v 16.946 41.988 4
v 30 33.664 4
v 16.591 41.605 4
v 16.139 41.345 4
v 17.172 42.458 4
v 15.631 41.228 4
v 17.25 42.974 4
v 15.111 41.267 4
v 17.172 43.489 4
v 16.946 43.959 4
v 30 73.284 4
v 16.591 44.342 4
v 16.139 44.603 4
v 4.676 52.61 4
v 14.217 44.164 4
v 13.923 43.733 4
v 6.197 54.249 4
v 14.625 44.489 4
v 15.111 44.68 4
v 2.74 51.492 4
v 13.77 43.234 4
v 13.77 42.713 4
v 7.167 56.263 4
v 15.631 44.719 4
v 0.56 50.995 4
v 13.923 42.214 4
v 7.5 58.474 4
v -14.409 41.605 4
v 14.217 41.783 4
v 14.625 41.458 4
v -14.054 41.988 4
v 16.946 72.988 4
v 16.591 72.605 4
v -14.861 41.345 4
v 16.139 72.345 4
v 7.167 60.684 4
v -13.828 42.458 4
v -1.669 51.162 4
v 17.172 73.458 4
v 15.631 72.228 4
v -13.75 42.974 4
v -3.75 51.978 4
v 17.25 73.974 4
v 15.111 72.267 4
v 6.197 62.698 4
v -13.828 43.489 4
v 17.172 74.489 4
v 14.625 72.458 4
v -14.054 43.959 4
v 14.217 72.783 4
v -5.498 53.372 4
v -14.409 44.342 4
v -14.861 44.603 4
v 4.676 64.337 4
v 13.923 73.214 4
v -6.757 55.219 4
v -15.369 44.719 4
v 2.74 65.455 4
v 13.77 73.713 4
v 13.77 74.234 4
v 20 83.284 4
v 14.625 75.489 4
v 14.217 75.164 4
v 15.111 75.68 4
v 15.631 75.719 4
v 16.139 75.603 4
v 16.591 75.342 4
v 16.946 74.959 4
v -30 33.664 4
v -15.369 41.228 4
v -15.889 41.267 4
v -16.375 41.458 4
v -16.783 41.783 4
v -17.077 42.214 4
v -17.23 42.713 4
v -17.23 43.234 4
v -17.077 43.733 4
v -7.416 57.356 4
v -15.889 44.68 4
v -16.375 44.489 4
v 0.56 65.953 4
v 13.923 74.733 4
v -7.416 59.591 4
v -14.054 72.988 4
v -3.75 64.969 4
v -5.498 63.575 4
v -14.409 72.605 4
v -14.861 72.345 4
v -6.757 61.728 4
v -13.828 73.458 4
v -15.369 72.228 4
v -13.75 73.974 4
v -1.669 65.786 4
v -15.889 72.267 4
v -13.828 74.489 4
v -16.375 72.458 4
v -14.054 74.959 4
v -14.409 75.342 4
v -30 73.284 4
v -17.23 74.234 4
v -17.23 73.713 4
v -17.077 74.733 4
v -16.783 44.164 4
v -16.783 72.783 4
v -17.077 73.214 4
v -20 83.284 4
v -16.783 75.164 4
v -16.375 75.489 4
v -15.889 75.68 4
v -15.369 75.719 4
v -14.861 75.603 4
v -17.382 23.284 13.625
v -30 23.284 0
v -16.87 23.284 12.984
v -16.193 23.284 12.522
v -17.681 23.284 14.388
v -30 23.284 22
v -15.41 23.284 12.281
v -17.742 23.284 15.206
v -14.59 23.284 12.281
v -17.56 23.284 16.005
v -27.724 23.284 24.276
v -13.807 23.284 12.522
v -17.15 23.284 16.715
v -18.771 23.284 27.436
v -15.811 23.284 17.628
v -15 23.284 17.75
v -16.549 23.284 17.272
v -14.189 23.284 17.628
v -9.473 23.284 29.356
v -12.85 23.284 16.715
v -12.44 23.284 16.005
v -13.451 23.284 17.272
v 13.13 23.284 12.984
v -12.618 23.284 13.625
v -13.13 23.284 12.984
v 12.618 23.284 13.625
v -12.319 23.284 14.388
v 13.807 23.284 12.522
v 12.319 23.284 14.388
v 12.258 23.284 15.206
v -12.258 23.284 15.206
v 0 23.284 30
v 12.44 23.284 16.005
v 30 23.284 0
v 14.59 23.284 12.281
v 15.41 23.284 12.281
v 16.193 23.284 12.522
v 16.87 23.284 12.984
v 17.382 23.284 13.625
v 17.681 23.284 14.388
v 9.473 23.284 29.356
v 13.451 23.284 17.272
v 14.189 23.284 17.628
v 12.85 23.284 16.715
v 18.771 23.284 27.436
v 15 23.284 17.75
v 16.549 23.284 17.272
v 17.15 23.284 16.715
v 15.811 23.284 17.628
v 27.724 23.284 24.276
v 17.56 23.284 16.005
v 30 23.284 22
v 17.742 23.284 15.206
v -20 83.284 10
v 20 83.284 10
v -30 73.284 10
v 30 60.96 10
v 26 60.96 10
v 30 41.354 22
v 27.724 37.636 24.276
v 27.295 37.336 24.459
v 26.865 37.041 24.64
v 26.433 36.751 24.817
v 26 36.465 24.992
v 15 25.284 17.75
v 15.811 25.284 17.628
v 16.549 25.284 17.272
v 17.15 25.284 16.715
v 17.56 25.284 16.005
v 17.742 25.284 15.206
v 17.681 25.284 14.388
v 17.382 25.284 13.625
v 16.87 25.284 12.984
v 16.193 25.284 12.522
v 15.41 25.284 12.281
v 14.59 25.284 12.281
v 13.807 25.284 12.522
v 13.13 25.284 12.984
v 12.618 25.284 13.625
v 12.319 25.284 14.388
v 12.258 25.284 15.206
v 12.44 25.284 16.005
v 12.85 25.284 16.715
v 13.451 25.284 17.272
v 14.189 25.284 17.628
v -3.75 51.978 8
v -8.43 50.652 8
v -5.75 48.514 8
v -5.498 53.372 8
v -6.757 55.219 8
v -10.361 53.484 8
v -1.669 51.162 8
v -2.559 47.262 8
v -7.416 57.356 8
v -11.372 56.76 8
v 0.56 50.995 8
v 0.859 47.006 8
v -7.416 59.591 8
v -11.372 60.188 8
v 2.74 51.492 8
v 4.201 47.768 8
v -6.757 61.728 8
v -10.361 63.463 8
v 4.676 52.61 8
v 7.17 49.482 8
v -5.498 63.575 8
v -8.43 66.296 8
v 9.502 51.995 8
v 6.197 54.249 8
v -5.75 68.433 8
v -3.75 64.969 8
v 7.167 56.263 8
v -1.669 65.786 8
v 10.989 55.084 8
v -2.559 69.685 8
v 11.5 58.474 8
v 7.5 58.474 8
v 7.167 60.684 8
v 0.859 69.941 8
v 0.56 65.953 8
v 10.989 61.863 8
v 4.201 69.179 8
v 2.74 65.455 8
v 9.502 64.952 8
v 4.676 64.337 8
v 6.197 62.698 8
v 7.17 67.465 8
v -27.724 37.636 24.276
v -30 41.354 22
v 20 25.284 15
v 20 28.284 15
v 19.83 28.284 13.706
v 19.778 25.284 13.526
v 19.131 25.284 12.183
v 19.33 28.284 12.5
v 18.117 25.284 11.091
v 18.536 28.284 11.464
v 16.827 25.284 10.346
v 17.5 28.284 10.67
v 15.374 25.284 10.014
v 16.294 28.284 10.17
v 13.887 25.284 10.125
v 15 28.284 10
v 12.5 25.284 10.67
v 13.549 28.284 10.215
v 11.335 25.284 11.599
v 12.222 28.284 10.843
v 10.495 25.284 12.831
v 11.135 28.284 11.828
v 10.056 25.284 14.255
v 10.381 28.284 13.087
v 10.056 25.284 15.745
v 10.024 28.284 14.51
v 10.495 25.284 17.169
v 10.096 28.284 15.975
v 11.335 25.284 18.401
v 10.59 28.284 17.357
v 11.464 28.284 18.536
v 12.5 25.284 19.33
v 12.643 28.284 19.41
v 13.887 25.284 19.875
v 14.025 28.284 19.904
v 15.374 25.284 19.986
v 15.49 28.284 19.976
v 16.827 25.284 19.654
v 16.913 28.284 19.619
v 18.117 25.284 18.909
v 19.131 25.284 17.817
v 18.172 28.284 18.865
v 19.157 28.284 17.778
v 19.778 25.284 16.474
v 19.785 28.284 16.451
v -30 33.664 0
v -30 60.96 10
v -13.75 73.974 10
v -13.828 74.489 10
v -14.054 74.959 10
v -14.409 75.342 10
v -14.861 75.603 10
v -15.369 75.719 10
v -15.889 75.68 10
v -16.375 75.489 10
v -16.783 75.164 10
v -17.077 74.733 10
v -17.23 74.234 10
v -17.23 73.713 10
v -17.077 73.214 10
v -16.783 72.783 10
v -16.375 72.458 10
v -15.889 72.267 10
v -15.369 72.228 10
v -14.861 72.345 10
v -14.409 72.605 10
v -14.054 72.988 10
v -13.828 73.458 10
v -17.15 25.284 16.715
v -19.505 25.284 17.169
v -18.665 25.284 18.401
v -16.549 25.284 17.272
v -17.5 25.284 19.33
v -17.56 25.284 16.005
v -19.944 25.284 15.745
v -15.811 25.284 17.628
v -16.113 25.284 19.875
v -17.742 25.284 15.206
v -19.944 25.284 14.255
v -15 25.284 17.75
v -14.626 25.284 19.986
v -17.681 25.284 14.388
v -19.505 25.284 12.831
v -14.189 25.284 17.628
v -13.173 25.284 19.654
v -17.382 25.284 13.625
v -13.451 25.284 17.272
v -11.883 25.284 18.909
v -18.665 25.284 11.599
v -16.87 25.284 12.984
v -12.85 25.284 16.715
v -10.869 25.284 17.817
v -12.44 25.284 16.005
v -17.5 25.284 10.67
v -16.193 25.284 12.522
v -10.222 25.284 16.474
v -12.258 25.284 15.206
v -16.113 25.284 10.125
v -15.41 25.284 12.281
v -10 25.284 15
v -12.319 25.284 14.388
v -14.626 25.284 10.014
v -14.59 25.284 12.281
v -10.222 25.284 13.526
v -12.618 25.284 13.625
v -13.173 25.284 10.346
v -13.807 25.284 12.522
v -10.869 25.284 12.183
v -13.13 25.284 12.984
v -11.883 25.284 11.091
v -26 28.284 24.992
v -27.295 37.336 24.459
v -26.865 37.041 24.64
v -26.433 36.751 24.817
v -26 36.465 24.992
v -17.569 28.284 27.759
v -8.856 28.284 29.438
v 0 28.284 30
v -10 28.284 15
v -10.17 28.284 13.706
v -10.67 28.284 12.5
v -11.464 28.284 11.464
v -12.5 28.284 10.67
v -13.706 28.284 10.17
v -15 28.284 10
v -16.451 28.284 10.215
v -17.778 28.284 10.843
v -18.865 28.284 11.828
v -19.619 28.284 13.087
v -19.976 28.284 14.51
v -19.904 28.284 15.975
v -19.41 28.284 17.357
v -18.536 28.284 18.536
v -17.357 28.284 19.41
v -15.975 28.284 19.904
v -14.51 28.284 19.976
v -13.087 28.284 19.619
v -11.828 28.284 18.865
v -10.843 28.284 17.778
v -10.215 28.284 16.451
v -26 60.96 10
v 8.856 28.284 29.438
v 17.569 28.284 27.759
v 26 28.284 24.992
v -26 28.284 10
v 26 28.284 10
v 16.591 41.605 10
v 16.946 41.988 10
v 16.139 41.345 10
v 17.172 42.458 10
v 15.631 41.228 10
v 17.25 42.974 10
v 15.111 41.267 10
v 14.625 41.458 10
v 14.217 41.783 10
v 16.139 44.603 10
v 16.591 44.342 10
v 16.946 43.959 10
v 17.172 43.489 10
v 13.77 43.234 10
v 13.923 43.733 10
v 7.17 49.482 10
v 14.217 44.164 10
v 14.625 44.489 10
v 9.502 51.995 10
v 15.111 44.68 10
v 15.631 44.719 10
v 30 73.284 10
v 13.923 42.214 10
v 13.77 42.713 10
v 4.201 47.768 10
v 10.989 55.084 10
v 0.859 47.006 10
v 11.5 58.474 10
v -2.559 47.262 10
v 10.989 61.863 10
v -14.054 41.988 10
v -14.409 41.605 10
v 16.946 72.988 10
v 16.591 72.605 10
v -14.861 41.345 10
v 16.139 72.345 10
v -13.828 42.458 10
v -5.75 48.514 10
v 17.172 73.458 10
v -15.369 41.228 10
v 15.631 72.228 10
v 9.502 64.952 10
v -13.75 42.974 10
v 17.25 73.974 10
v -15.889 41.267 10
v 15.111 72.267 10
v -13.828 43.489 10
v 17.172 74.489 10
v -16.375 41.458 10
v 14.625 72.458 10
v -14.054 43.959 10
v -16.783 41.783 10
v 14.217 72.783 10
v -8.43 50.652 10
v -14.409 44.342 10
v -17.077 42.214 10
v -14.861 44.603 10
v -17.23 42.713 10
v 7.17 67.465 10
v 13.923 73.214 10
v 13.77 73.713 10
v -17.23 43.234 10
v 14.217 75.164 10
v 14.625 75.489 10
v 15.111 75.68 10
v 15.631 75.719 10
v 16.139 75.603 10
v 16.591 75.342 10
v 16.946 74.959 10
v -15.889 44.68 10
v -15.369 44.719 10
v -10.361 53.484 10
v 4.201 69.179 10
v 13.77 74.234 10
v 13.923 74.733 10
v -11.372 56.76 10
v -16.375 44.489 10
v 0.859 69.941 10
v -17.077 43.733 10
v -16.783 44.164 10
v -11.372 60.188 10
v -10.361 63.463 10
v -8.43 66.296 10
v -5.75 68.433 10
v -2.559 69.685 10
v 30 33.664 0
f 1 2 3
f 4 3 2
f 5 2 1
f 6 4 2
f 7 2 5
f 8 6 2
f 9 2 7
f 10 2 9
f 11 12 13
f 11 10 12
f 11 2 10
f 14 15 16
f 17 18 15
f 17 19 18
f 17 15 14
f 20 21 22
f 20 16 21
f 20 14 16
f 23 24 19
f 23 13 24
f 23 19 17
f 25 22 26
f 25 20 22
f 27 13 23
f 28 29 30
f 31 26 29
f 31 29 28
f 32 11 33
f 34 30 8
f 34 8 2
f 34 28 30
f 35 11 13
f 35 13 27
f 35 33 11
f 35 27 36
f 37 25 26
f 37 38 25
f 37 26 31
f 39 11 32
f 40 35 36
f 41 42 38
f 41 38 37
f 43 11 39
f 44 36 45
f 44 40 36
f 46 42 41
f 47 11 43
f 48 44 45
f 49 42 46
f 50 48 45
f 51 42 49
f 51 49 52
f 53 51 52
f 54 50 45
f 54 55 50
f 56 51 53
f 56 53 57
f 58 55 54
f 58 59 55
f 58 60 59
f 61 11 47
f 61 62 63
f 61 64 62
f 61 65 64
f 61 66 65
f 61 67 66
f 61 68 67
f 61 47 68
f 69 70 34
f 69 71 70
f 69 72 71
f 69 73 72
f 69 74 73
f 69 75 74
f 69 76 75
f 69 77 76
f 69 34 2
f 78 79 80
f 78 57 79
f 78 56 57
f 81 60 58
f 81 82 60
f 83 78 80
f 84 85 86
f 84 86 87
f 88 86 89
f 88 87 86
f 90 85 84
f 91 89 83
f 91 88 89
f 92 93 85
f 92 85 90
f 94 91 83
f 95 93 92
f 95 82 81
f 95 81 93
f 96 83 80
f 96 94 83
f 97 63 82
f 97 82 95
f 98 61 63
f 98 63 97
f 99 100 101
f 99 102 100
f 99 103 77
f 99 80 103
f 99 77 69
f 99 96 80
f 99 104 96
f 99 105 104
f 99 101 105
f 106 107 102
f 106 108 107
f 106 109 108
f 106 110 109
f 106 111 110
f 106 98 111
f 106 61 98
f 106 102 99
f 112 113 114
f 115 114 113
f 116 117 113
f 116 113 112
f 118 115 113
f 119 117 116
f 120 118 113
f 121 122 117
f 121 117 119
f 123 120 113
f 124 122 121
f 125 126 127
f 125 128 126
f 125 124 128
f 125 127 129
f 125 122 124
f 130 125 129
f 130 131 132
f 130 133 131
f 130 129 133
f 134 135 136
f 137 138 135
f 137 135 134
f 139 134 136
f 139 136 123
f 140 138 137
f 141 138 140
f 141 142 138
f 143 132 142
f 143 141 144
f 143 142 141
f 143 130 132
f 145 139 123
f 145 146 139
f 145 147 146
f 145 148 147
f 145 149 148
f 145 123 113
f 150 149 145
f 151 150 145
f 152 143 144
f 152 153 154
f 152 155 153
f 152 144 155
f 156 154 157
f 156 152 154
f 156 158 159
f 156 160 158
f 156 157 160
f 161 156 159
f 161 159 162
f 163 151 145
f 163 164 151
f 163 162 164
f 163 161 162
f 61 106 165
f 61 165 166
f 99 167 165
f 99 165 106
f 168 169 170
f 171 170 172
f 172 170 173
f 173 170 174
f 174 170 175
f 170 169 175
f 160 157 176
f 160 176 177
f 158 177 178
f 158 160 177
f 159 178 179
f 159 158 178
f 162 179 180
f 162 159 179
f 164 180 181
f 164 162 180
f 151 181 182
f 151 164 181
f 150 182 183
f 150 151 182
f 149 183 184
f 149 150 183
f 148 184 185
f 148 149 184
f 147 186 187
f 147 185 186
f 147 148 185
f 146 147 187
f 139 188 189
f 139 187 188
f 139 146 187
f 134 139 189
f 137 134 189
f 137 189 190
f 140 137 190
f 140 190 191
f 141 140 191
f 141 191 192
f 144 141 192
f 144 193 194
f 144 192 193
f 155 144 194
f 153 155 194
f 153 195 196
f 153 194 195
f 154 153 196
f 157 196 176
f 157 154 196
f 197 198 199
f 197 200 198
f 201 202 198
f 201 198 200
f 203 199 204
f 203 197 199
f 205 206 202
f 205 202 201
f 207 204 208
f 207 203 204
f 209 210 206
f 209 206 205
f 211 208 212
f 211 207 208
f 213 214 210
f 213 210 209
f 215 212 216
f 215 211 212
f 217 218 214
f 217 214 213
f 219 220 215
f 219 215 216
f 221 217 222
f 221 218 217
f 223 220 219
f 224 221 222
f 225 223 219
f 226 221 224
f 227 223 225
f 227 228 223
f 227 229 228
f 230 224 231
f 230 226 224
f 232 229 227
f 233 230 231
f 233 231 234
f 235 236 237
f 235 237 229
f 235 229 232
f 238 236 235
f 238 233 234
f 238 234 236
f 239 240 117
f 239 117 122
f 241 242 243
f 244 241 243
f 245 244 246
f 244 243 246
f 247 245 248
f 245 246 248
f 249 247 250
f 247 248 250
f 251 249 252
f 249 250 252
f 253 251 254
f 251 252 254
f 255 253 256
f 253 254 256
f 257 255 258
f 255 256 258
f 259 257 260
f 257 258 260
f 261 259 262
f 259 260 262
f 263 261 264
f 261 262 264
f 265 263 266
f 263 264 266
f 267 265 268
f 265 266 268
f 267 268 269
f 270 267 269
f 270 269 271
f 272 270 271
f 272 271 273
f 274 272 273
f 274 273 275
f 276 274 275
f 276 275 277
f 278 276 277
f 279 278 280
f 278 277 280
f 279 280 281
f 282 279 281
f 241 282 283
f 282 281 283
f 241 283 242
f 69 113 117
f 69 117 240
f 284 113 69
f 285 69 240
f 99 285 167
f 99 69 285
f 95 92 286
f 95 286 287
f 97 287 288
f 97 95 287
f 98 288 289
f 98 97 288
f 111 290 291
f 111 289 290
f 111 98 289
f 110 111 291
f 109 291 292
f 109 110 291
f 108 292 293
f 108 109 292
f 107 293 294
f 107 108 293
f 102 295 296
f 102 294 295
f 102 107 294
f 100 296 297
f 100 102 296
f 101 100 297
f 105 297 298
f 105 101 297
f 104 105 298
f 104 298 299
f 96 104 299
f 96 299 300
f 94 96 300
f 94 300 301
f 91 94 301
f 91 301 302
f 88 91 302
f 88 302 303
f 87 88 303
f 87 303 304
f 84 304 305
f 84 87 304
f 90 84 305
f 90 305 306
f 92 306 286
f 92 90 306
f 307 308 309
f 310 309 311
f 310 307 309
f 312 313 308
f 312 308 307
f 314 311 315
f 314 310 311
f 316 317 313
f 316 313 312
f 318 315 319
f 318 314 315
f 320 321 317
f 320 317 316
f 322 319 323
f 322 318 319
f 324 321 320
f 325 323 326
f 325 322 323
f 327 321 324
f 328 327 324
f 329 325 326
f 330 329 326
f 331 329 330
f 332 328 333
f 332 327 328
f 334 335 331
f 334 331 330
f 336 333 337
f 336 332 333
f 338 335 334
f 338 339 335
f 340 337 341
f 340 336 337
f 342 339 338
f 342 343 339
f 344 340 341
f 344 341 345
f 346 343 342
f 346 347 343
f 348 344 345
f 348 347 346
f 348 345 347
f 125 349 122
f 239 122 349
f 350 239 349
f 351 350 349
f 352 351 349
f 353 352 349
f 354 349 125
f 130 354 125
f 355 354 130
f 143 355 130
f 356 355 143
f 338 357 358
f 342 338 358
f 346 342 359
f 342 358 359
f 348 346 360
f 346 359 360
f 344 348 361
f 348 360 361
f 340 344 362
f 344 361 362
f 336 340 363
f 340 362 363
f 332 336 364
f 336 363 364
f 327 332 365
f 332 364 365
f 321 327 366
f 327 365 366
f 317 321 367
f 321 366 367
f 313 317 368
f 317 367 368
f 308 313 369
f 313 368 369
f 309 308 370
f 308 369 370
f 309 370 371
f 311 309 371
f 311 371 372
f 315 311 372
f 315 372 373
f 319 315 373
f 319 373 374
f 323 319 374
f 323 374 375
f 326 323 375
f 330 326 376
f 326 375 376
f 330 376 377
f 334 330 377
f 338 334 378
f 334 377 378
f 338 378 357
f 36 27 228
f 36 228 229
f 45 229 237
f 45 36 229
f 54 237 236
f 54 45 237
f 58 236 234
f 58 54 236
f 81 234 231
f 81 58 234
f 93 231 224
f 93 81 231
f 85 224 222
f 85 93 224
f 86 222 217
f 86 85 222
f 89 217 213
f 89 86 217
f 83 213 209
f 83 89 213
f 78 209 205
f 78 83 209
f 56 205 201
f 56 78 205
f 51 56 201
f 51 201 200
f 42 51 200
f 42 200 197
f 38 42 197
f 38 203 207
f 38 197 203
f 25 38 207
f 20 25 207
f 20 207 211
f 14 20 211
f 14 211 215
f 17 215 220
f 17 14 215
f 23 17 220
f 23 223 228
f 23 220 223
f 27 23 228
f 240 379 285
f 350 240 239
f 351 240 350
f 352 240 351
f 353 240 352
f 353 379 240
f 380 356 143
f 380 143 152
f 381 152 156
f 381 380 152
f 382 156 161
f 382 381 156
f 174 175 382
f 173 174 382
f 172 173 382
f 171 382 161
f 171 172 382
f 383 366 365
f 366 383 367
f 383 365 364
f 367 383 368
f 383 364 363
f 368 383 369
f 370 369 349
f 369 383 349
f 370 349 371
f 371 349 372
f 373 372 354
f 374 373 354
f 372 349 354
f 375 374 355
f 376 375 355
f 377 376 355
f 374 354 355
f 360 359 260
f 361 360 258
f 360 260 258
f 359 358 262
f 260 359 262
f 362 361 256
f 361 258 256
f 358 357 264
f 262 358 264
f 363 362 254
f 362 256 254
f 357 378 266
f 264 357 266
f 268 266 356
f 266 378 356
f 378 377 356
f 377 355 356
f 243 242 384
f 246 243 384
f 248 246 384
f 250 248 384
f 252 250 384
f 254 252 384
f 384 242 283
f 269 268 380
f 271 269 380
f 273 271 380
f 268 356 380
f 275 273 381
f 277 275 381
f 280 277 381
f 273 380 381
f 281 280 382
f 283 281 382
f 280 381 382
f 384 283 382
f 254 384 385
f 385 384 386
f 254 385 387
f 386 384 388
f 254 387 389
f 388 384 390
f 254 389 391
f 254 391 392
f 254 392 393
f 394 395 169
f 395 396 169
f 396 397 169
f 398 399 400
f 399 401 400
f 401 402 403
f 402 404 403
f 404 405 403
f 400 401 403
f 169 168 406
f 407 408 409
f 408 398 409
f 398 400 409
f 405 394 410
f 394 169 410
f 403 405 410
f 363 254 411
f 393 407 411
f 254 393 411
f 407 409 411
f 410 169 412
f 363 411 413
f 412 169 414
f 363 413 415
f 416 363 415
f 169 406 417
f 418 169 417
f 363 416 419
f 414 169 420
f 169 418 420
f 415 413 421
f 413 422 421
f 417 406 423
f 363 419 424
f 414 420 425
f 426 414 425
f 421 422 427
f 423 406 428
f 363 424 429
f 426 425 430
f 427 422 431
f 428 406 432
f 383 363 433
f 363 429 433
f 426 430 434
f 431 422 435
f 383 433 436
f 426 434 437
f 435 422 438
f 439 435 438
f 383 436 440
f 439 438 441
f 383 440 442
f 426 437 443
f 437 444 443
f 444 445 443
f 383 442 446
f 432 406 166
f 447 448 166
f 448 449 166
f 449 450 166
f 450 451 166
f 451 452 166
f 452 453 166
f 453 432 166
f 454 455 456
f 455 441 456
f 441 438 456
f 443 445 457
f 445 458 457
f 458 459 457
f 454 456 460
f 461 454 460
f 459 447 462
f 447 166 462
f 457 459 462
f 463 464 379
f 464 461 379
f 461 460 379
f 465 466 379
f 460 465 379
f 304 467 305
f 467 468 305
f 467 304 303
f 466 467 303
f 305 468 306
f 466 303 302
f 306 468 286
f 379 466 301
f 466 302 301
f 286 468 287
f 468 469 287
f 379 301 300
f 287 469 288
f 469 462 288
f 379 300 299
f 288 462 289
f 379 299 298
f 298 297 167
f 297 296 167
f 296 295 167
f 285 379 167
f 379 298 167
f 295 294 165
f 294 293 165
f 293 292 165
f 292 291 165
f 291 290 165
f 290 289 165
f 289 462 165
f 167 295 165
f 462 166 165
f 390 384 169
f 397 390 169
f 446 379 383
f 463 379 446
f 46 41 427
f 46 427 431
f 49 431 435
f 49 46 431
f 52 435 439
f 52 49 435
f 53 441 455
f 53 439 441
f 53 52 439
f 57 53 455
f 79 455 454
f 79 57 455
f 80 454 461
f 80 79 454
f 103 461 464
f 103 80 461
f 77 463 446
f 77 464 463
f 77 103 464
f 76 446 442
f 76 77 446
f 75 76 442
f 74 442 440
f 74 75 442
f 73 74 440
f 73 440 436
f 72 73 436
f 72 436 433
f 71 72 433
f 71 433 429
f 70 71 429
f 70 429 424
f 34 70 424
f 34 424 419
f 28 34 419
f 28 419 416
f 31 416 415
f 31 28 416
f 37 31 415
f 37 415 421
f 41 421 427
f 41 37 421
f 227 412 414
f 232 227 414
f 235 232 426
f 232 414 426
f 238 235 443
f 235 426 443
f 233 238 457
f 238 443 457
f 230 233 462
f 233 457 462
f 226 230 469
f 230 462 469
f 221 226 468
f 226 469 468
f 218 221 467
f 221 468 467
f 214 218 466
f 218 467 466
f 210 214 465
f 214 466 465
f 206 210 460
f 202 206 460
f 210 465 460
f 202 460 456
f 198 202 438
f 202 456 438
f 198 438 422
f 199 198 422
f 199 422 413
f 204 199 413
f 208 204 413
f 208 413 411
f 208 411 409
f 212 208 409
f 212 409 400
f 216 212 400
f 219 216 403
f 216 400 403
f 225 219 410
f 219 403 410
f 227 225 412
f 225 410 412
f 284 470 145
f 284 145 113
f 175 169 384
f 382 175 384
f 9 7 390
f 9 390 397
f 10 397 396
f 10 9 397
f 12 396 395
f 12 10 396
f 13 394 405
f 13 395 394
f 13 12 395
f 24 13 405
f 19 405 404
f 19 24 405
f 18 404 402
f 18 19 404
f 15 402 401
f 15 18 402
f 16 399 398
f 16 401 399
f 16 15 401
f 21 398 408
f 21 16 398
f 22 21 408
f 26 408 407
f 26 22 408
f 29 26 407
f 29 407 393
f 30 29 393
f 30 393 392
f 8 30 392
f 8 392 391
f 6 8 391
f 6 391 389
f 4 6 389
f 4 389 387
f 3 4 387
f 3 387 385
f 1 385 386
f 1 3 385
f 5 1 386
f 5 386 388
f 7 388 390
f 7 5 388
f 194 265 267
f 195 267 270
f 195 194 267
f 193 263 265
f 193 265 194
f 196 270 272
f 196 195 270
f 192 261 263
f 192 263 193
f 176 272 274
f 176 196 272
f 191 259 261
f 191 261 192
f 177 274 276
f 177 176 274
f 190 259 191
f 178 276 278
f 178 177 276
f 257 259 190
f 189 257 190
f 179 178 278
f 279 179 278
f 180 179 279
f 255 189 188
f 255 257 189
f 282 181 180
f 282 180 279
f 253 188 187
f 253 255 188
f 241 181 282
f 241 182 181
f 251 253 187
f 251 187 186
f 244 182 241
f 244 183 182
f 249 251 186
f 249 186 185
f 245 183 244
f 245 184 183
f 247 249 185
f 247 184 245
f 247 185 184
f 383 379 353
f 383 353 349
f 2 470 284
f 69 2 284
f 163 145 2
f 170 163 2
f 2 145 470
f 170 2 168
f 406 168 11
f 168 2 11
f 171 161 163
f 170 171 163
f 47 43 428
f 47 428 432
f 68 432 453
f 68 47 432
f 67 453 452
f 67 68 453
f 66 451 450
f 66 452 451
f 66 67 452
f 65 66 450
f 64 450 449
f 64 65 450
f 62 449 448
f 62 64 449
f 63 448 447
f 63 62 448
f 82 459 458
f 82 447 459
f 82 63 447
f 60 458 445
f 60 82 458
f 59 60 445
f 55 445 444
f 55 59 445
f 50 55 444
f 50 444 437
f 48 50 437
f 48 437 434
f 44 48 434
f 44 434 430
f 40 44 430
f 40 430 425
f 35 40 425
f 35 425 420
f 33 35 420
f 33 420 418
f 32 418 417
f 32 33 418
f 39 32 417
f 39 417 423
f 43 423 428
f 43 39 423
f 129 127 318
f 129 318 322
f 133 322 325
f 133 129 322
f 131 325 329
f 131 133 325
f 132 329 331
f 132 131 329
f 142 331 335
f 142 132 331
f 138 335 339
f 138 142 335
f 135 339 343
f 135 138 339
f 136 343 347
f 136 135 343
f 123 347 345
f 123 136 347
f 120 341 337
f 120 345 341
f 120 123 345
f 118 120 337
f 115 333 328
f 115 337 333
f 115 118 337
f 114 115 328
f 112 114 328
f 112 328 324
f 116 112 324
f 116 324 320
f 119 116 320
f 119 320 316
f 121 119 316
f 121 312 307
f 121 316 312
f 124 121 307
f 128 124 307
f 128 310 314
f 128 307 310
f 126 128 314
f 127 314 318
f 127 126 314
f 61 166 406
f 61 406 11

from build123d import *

# Parameters (mm, degrees)
SKETCH1_W                = 120
SKETCH1_H                = 30
BOSS_EXTRUDE1_DEPTH      = 100
SKETCH3_OUTSIDE_W        = 153.812
SKETCH3_OUTSIDE_H        = 133.812
CUT_EXTRUDE2_DEPTH       = 121.415945788
CUT_EXTRUDE3_START       = -30
CUT_EXTRUDE3_DEPTH       = 30
SKETCH5_W                = 67.698745078
SKETCH5_H                = 100.8
CUT_EXTRUDE4_DEPTH       = 20
RIB1_REACH               = 122.416
SKETCH6_WALL_W           = 281.143052644
SKETCH6_WALL_H           = 4
RIB6_REACH               = 122.416
SKETCH7_WALL_W           = 281.143052644
SKETCH7_WALL_H           = 4
CUT_EXTRUDE5_DEPTH       = 84.326168543
CUT_EXTRUDE5_DEPTH_BACK  = 84.326168543
SKETCH9_R                = 2.75
SKETCH10_R               = 5
CUT_EXTRUDE6_DEPTH       = 3
CHAMFER1_SIZE            = 8
CUT_EXTRUDE7_START       = -14.352520936
CUT_EXTRUDE7_DEPTH       = 14.352520936
SKETCH13_W               = 60
SKETCH13_H               = 40
BOSS_EXTRUDE2_DEPTH      = 10
CUT_EXTRUDE8_DEPTH       = 108.204960324
CUT_EXTRUDE8_DEPTH_BACK  = 108.204960324
SKETCH12_R               = 1.75
SKETCH12_R_2             = 7.5
CHAMFER2_SIZE            = 10
SKETCH14_R               = 11.5
CUT_EXTRUDE9_DEPTH       = 1
BOSS_EXTRUDE3_START      = 1
SKETCH16_W               = 42.5
SKETCH16_H               = 42.5
SKETCH16_R               = 1.75
SKETCH16_R_2             = 11.5
BOSS_EXTRUDE3_DEPTH      = 1
SKETCH17_W               = 48.072912132
SKETCH17_H               = 52.974055018
BOSS_EXTRUDE4_DEPTH      = 10
SKETCH17_2_W             = 48.072912132
SKETCH17_2_H             = 52.974055018
CUT_EXTRUDE10_DEPTH      = 108.204960324
CUT_EXTRUDE11_DEPTH      = 108.204960324
CUT_EXTRUDE11_DEPTH_BACK = 108.204960324
SKETCH18_R               = 7.5
SKETCH18_R_2             = 1.75
SKETCH19_R               = 11.5
CUT_EXTRUDE12_DEPTH      = 2
CUT_EXTRUDE13_DEPTH      = 108.204960324
CUT_EXTRUDE13_DEPTH_BACK = 108.204960324
SKETCH20_W               = 88.74197012
SKETCH20_H               = 29.925009901
CHAMFER3_SIZE            = 10
SKETCH22_W               = 69.690835078
SKETCH22_H               = 49.62
CUT_EXTRUDE14_DEPTH      = 4


# Read off the part's stored shape, not the designer's step: Cut-Extrude3, Cut-Extrude7
with BuildPart() as part:
    # Sketch1 → Boss-Extrude1 (new body)
    with BuildSketch(Plane(origin=(0, 0, 0), x_dir=(1, 0, 0), z_dir=(0, 1, 0))):
        with Locations((0, -15)):
            Rectangle(SKETCH1_W, SKETCH1_H)
    extrude(amount=BOSS_EXTRUDE1_DEPTH)

    # Sketch3 outside → Cut-Extrude2 (cut, through all)
    with BuildSketch(Plane.XY.offset(30)):
        with Locations((0, 50)):
            Rectangle(SKETCH3_OUTSIDE_W, SKETCH3_OUTSIDE_H)
        with BuildLine():
            Line((-45, 23.283541889), (45, 23.283541889))
            Line((45, 23.283541889), (19.804596008, 86.568297014))
            ThreePointArc((19.804596008, 86.568297014), (0, 100), (-19.804596008, 86.568297014))
            Line((-19.804596008, 86.568297014), (-45, 23.283541889))
        make_face(mode=Mode.SUBTRACT)
    extrude(amount=-CUT_EXTRUDE2_DEPTH, mode=Mode.SUBTRACT)

    # Cut-Extrude3 outline → Cut-Extrude3 (cut)
    with BuildSketch(Plane.XY.offset(30).offset(CUT_EXTRUDE3_START)):
        Polygon((30, 60.95991045), (30, 23.283541889), (45, 23.283541889), align=None)
        Polygon((-30, 23.283541889), (-30, 60.95991045), (-45, 23.283541889), align=None)
    extrude(amount=CUT_EXTRUDE3_DEPTH, mode=Mode.SUBTRACT)

    # Sketch5 → Cut-Extrude4 (cut)
    with BuildSketch(Plane.XY.offset(30)):
        with Locations((0, 78.683541889)):
            Rectangle(SKETCH5_W, SKETCH5_H)
    extrude(amount=-CUT_EXTRUDE4_DEPTH, mode=Mode.SUBTRACT)

    # Sketch6 wall → Rib1 (add, up to next)
    with BuildSketch(Plane(origin=(-30, 44.62172617, 20), x_dir=(0, -0.852920340981, 0.522041082618), z_dir=(0, 0.522041082618, 0.852920340981)), mode=Mode.PRIVATE) as rib1_sk1:
        with Locations((0, 2)):
            Rectangle(SKETCH6_WALL_W, SKETCH6_WALL_H)
    rib1_tool1 = extrude(rib1_sk1.sketch, amount=-RIB1_REACH, mode=Mode.PRIVATE) - part.part
    add(rib1_tool1.solids().sort_by_distance((-30, 44.62172617, 20))[0])

    # Sketch7 wall → Rib6 (add, up to next)
    with BuildSketch(Plane(origin=(30, 44.62172617, 20), x_dir=(0, -0.852920340981, 0.522041082618), z_dir=(0, -0.522041082618, -0.852920340981)), mode=Mode.PRIVATE) as rib6_sk1:
        with Locations((0, 2)):
            Rectangle(SKETCH7_WALL_W, SKETCH7_WALL_H)
    rib6_tool1 = extrude(rib6_sk1.sketch, amount=RIB6_REACH, mode=Mode.PRIVATE) - part.part
    add(rib6_tool1.solids().sort_by_distance((30, 44.62172617, 20))[0])

    # Sketch9 → Cut-Extrude5 (cut, two sides: drawn at the far end of the back side and taken through both)
    with BuildSketch(Plane(origin=(0, 28.283541889, 0), x_dir=(1, 0, 0), z_dir=(0, 1, 0)).offset(-CUT_EXTRUDE5_DEPTH_BACK)):
        with Locations(Location((-15, -15, 0), (0, 0, 270))):
            Circle(SKETCH9_R)
        with Locations(Location((15, -15, 0), (0, 0, 270))):
            Circle(SKETCH9_R)
    extrude(amount=CUT_EXTRUDE5_DEPTH + CUT_EXTRUDE5_DEPTH_BACK, mode=Mode.SUBTRACT)

    # Sketch10 → Cut-Extrude6 (cut)
    with BuildSketch(Plane(origin=(0, 28.283541889, 0), x_dir=(1, 0, 0), z_dir=(0, 1, 0))):
        with Locations((-15, -15)):
            Circle(SKETCH10_R)
        with Locations((15, -15)):
            Circle(SKETCH10_R)
    extrude(amount=-CUT_EXTRUDE6_DEPTH, mode=Mode.SUBTRACT)

    # Chamfer1
    # the kernel refuses this chamfer: 8 mm, written as the material it takes off along each edge
    with BuildSketch(Plane(origin=(-30, 2.710077985, 30), x_dir=(-0.027495876610586535, 0, -0.9996219169112968), z_dir=(0, 1, 0))) as chamfer1_piece_1:
        Polygon((CHAMFER1_SIZE * 0.999621916911, -CHAMFER1_SIZE * 0.0274958766106), (-CHAMFER1_SIZE * 0.0274958766106, -CHAMFER1_SIZE * 0.999621916911), (0, 0), align=None)
    extrude(amount=46.146927807, mode=Mode.SUBTRACT)
    with BuildSketch(Plane(origin=(30, 48.857005793, 30), x_dir=(-0.9996219169112968, 0, 0.027495876610586487), z_dir=(0, -1, 0))) as chamfer1_piece_2:
        Polygon((CHAMFER1_SIZE * 0.999621916911, CHAMFER1_SIZE * 0.0274958766106), (-CHAMFER1_SIZE * 0.0274958766106, CHAMFER1_SIZE * 0.999621916911), (0, 0), align=None)
    extrude(amount=46.146927807, mode=Mode.SUBTRACT)

    # Cut-Extrude7 outline → Cut-Extrude7 (cut)
    with BuildSketch(Plane.XZ.offset(-23.283541889).offset(CUT_EXTRUDE7_START)):
        with BuildLine():
            ThreePointArc((-27.724333118, 24.275666882), (-14.154563191, 28.553981218), (0, 30))
            Line((0, 30), (-22, 30))
            Line((-22, 30), (-27.724333118, 24.275666882))
        make_face()
        with BuildLine():
            ThreePointArc((0, 30), (14.154563191, 28.553981218), (27.724333118, 24.275666882))
            Line((27.724333118, 24.275666882), (22, 30))
            Line((22, 30), (0, 30))
        make_face()
    extrude(amount=CUT_EXTRUDE7_DEPTH, mode=Mode.SUBTRACT)

    # Sketch13 → Boss-Extrude2 (add)
    with BuildSketch(Plane(origin=(0, 0, 0), x_dir=(-1, 0, 0), z_dir=(0, 0, -1))):
        with Locations((0, 80.95991045)):
            Rectangle(SKETCH13_W, SKETCH13_H)
    extrude(amount=-BOSS_EXTRUDE2_DEPTH)

    # Sketch12 → Cut-Extrude8 (cut, two sides: drawn at the far end of the back side and taken through both)
    with BuildSketch(Plane.XY.offset(10).offset(-CUT_EXTRUDE8_DEPTH_BACK)):
        with Locations((-15.5, 84.083541889)):
            Circle(SKETCH12_R)
        with Locations((15.5, 84.083541889)):
            Circle(SKETCH12_R)
        with Locations((-15.5, 53.083541889)):
            Circle(SKETCH12_R)
        with Locations((15.5, 53.083541889)):
            Circle(SKETCH12_R)
        with Locations((0, 68.583541889)):
            Circle(SKETCH12_R_2)
    extrude(amount=CUT_EXTRUDE8_DEPTH + CUT_EXTRUDE8_DEPTH_BACK, mode=Mode.SUBTRACT)

    # Chamfer2
    chamfer2_edges = [part.edges().sort_by_distance(p)[0] for p in [
        (-30, 100.95991045, 5),
        (30, 100.95991045, 5),
    ]]
    chamfer(chamfer2_edges, length=CHAMFER2_SIZE)

    # Sketch14 → Cut-Extrude9 (cut)
    with BuildSketch(Plane.XY.offset(10)):
        with Locations((0, 68.583541889)):
            Circle(SKETCH14_R)
    extrude(amount=-CUT_EXTRUDE9_DEPTH, mode=Mode.SUBTRACT)

    # Sketch16 → Boss-Extrude3 (add)
    with BuildSketch(Plane.XY.offset(10).offset(BOSS_EXTRUDE3_START)):
        with Locations((0, 68.583541889)):
            Rectangle(SKETCH16_W, SKETCH16_H)
        with Locations((-15.5, 84.083541889)):
            Circle(SKETCH16_R, mode=Mode.SUBTRACT)
        with Locations((15.5, 84.083541889)):
            Circle(SKETCH16_R, mode=Mode.SUBTRACT)
        with Locations((15.5, 53.083541889)):
            Circle(SKETCH16_R, mode=Mode.SUBTRACT)
        with Locations((-15.5, 53.083541889)):
            Circle(SKETCH16_R, mode=Mode.SUBTRACT)
        with Locations((0, 68.583541889)):
            Circle(SKETCH16_R_2, mode=Mode.SUBTRACT)
    extrude(amount=-BOSS_EXTRUDE3_DEPTH)

    # Sketch17 → Boss-Extrude4 (add)
    with BuildSketch(Plane.XY.offset(10)):
        with Locations((0, 67.231428327)):
            Rectangle(SKETCH17_W, SKETCH17_H)
    extrude(amount=-BOSS_EXTRUDE4_DEPTH)

    # Sketch17<2> → Cut-Extrude10 (cut, through all)
    with BuildSketch(Plane.XY.offset(10)):
        with Locations((0, 67.231428327)):
            Rectangle(SKETCH17_2_W, SKETCH17_2_H)
    extrude(amount=CUT_EXTRUDE10_DEPTH, mode=Mode.SUBTRACT)

    # Sketch18 → Cut-Extrude11 (cut, two sides: drawn at the far end of the back side and taken through both)
    with BuildSketch(Plane.XY.offset(10).offset(-CUT_EXTRUDE11_DEPTH_BACK)):
        with Locations((0, 58.473541889)):
            Circle(SKETCH18_R)
        with Locations((-15.5, 73.973541889)):
            Circle(SKETCH18_R_2)
        with Locations((-15.5, 42.973541889)):
            Circle(SKETCH18_R_2)
        with Locations((15.5, 42.973541889)):
            Circle(SKETCH18_R_2)
        with Locations((15.5, 73.973541889)):
            Circle(SKETCH18_R_2)
    extrude(amount=CUT_EXTRUDE11_DEPTH + CUT_EXTRUDE11_DEPTH_BACK, mode=Mode.SUBTRACT)

    # Sketch19 → Cut-Extrude12 (cut)
    with BuildSketch(Plane.XY.offset(10)):
        with Locations((0, 58.473541889)):
            Circle(SKETCH19_R)
    extrude(amount=-CUT_EXTRUDE12_DEPTH, mode=Mode.SUBTRACT)

    # Sketch20 → Cut-Extrude13 (cut, two sides: drawn at the far end of the back side and taken through both)
    with BuildSketch(Plane.XY.offset(10).offset(-CUT_EXTRUDE13_DEPTH_BACK)):
        with Locations((2.815550168, 98.246046839)):
            Rectangle(SKETCH20_W, SKETCH20_H)
    extrude(amount=CUT_EXTRUDE13_DEPTH + CUT_EXTRUDE13_DEPTH_BACK, mode=Mode.SUBTRACT)

    # Chamfer3
    chamfer3_edges = [part.edges().sort_by_distance(p)[0] for p in [
        (30, 83.283541889, 5),
        (-30, 83.283541889, 5),
    ]]
    chamfer(chamfer3_edges, length=CHAMFER3_SIZE)

    # Sketch22 → Cut-Extrude14 (cut)
    with BuildSketch(Plane(origin=(0, 0, 0), x_dir=(-1, 0, 0), z_dir=(0, 0, -1))):
        with Locations((0, 58.473541889)):
            Rectangle(SKETCH22_W, SKETCH22_H)
    extrude(amount=-CUT_EXTRUDE14_DEPTH, mode=Mode.SUBTRACT)


solid = part.part
